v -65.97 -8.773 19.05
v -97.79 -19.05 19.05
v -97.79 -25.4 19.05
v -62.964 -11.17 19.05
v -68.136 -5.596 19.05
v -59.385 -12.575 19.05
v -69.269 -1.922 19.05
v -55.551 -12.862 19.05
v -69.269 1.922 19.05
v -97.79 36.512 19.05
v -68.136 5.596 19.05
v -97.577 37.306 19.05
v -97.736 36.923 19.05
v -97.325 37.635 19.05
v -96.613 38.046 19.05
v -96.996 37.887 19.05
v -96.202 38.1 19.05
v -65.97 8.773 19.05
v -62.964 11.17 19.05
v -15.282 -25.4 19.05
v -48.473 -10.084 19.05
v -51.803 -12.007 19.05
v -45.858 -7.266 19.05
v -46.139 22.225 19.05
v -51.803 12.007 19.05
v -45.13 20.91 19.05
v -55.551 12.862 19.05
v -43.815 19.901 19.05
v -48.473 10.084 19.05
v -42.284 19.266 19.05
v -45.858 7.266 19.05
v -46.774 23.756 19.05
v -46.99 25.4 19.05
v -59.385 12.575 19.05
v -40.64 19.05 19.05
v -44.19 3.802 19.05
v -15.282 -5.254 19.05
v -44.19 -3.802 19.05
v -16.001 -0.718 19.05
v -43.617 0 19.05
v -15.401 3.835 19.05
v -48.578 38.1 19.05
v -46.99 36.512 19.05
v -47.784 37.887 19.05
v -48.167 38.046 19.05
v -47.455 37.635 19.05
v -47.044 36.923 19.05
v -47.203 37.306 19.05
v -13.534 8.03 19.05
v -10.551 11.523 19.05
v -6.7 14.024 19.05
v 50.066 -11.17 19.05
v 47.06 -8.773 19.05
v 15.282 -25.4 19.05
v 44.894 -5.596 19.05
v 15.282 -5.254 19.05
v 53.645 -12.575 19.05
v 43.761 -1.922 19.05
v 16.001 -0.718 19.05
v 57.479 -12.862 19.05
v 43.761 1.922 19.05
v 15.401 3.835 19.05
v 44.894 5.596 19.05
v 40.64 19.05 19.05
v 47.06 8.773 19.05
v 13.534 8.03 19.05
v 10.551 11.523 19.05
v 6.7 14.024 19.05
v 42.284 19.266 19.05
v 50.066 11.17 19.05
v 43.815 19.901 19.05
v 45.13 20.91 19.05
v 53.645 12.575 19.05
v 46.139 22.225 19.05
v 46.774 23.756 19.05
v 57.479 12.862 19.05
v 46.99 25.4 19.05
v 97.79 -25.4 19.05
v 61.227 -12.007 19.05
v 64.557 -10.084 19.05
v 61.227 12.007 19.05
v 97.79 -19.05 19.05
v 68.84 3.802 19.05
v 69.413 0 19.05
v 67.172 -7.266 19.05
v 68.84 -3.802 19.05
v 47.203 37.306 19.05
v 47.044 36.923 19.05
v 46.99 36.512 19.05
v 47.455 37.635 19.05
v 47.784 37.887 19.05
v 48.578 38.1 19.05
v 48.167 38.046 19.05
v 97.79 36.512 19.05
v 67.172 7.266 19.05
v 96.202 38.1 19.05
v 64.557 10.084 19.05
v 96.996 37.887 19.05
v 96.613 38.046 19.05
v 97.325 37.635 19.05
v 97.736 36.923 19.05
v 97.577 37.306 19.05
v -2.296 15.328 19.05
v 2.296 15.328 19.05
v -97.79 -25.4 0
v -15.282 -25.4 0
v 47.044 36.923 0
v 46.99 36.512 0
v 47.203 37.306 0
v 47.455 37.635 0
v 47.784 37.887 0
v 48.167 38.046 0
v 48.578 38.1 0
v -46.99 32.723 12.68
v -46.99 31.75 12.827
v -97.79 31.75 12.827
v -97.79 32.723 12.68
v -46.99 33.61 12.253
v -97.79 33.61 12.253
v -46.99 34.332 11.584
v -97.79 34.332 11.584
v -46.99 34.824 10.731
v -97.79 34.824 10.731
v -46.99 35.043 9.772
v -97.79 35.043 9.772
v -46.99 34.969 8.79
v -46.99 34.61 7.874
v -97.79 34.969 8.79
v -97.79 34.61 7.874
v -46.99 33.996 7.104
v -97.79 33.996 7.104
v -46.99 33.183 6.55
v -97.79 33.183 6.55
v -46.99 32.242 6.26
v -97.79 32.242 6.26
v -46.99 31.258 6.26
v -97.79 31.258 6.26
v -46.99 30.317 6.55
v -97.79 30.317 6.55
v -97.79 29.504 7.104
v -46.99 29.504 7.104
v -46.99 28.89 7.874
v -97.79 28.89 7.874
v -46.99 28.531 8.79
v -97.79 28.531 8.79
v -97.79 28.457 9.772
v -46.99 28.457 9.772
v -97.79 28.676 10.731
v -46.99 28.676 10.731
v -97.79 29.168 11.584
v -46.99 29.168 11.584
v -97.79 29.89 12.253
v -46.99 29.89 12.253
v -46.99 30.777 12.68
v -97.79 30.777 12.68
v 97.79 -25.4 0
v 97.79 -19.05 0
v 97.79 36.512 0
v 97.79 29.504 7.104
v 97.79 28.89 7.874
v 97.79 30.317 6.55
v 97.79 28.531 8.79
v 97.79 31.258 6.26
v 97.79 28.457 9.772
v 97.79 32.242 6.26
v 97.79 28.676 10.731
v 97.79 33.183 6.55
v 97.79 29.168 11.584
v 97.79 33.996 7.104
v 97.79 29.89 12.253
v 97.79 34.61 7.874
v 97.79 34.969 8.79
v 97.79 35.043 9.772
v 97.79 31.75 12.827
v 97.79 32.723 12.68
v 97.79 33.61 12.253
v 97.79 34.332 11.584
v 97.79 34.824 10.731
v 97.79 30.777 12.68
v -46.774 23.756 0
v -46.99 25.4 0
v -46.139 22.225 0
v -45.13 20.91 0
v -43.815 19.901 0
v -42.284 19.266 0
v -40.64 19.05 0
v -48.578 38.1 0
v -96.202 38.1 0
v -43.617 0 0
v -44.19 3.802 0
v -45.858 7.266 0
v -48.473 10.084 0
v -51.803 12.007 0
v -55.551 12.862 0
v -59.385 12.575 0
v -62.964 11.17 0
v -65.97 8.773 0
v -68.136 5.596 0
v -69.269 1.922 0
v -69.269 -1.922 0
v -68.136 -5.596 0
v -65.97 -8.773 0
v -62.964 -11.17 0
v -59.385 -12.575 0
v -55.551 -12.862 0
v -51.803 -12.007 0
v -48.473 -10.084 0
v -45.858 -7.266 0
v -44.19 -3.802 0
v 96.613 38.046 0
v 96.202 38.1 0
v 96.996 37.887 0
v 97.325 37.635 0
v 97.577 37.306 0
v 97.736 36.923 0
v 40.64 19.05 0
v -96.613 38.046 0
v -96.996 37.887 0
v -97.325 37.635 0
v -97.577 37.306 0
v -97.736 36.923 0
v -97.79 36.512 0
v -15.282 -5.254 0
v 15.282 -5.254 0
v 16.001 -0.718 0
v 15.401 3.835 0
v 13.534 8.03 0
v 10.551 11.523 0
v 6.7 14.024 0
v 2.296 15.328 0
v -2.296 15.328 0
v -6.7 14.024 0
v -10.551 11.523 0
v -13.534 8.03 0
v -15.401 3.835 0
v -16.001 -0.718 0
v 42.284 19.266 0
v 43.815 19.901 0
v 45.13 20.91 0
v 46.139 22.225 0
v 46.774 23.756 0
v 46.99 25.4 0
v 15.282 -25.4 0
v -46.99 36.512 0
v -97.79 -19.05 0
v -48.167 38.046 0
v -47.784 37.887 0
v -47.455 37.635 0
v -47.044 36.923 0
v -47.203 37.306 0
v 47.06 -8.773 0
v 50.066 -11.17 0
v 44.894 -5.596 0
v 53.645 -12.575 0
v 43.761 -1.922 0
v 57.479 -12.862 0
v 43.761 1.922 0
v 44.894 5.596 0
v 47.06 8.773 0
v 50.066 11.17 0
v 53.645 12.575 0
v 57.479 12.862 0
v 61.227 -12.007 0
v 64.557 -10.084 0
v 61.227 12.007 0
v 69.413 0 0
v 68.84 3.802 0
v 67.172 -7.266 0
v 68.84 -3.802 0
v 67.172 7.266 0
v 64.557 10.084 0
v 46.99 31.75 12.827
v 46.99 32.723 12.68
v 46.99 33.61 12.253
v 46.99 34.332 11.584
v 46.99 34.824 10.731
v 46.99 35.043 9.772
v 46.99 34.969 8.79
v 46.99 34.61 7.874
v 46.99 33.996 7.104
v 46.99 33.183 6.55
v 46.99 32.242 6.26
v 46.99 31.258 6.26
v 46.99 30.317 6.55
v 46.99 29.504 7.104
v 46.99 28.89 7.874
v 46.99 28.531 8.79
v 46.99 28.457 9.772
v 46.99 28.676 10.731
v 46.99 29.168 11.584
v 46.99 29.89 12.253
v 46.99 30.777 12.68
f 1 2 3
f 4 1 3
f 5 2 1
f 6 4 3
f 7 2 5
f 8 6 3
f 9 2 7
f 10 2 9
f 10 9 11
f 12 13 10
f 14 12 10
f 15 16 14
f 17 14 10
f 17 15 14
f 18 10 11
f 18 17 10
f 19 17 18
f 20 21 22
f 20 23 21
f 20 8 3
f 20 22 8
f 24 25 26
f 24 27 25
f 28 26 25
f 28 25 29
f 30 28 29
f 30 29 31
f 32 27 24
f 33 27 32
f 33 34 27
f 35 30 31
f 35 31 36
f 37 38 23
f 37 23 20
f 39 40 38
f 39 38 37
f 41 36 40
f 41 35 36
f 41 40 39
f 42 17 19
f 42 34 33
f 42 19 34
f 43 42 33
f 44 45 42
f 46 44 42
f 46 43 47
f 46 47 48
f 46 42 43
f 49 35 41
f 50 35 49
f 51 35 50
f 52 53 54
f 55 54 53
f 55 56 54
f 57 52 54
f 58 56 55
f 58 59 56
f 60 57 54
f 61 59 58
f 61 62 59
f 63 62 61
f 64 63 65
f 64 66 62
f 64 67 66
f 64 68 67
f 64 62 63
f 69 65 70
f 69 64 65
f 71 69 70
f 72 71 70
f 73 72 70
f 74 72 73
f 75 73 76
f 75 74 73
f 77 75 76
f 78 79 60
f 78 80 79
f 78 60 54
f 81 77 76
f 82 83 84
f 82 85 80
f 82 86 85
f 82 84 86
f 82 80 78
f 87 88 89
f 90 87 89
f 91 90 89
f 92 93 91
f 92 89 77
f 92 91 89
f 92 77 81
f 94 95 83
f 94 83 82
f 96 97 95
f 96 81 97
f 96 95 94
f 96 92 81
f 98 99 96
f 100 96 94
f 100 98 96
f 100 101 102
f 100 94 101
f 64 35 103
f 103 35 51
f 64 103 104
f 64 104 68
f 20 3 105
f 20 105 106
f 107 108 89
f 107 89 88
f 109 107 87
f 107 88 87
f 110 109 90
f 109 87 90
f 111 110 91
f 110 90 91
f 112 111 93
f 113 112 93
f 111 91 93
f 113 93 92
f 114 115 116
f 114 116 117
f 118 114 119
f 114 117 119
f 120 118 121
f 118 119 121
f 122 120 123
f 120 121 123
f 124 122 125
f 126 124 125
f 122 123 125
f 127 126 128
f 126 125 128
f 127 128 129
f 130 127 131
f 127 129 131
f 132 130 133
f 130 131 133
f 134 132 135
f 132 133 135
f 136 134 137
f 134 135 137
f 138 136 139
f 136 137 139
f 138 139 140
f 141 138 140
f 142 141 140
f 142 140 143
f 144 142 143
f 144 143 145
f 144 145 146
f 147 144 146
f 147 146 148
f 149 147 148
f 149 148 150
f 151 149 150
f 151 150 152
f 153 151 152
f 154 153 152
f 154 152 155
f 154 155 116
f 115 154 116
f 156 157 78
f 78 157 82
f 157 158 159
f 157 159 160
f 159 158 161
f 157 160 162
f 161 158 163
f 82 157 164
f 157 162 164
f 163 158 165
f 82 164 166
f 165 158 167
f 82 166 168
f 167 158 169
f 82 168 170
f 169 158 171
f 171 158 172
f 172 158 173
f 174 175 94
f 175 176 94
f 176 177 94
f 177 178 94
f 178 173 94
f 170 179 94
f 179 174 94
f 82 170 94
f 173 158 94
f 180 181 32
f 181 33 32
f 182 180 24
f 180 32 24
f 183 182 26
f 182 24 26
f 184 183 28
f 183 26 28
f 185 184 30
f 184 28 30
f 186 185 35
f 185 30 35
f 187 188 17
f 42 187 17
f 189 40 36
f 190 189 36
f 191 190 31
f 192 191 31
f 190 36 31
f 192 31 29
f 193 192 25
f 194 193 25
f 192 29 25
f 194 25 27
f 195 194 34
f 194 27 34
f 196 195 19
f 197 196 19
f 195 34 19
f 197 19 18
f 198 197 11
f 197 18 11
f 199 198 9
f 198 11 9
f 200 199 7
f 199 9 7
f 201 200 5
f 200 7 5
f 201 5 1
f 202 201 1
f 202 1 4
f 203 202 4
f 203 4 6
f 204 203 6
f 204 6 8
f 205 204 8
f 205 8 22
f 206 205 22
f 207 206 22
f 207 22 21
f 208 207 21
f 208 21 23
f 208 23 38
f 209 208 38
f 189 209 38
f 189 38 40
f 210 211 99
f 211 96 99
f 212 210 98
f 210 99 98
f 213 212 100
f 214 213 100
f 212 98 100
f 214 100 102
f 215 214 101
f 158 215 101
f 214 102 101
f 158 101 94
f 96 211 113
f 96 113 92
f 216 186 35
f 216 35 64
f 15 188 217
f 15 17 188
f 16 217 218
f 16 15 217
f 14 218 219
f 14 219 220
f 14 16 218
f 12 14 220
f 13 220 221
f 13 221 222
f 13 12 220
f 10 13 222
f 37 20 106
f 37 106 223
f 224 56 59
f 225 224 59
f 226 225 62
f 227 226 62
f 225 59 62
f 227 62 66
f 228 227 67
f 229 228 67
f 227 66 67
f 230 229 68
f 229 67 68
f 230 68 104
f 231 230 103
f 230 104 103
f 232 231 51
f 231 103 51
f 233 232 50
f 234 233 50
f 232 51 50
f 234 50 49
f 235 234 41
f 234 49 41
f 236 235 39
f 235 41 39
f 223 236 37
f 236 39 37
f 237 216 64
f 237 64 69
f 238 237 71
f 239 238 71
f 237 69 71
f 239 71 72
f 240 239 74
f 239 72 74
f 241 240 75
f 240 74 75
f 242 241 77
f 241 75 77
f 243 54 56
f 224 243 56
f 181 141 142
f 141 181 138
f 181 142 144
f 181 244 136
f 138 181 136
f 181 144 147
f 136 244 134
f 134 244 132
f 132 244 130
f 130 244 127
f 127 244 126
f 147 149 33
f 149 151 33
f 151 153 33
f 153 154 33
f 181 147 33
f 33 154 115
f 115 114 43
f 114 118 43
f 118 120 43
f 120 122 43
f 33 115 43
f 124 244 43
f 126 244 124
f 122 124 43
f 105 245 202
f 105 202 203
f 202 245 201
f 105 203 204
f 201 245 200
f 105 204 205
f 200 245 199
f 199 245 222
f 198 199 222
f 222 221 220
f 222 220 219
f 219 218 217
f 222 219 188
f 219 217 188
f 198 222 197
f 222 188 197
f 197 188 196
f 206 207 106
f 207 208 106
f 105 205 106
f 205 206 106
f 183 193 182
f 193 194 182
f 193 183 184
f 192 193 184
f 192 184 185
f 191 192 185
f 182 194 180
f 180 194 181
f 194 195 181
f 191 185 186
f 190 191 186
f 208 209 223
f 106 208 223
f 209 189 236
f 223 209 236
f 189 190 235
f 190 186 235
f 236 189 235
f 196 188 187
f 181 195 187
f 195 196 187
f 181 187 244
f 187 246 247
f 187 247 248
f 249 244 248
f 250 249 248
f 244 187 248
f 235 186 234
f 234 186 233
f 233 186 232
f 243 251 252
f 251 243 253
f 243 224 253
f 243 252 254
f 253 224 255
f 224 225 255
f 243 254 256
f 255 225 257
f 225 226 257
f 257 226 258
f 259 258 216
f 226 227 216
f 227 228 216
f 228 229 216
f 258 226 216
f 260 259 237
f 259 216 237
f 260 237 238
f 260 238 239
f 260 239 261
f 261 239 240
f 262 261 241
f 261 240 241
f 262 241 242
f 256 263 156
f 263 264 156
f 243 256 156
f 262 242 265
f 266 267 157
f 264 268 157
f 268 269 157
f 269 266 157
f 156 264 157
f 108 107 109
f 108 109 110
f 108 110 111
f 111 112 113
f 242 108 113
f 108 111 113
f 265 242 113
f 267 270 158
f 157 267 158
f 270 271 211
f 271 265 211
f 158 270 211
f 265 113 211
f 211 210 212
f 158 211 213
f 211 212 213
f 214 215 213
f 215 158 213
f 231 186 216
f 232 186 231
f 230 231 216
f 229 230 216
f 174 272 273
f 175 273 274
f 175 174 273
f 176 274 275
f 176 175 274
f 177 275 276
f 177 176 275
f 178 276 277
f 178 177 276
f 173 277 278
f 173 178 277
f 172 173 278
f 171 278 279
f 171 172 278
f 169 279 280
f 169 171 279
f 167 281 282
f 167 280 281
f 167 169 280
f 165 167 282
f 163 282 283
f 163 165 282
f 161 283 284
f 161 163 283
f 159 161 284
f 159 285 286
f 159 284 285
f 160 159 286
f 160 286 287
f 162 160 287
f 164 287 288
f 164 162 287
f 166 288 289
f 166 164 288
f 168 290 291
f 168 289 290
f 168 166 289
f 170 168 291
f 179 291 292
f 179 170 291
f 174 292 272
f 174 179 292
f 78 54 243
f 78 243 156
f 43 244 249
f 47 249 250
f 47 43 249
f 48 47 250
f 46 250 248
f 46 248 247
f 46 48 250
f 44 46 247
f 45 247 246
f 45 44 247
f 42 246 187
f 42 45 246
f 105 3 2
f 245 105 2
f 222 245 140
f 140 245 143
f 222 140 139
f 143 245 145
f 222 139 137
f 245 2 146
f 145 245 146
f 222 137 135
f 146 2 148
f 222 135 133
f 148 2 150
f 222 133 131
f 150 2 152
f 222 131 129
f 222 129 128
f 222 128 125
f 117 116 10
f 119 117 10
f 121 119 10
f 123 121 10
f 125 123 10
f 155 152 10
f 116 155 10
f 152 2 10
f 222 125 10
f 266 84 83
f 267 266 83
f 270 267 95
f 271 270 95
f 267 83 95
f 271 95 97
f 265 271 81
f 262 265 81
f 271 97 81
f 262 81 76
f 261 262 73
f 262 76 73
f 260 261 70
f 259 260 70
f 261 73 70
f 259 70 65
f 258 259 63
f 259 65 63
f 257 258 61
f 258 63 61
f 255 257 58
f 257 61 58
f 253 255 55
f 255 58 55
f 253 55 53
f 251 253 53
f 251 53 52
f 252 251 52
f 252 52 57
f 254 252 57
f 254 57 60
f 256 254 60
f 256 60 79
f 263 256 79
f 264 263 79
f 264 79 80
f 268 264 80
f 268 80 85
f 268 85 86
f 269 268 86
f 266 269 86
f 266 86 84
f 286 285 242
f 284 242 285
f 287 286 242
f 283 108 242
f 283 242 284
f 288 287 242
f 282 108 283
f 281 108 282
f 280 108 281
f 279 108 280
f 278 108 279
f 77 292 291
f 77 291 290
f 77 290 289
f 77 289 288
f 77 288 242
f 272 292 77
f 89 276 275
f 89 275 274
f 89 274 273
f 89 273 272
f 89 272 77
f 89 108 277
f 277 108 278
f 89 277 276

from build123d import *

# Parameters (mm, degrees)
SKETCH1_W               = 195.58
SKETCH1_H               = 38.1
BOSS_EXTRUDE1_DEPTH     = 19.05
SKETCH2_R               = 12.8984375
CUT_EXTRUDE1_DEPTH      = 20.05
CUT_EXTRUDE2_DEPTH      = 20.05
SKETCH4_W               = 19.05
SKETCH4_H               = 19.05
BOSS_EXTRUDE2_DEPTH     = 50.8
SKETCH6_R               = 3.302
CUT_EXTRUDE3_DEPTH      = 196.58
FILLET1_R               = 6.35
FILLET2_R               = 1.5875
SKETCH7_W               = 86.796683621
SKETCH7_H               = 6.35
BOSS_EXTRUDE3_DEPTH     = 19.05
SKETCH8_W               = 30.563761808
SKETCH8_H               = 20.145620364
CUT_EXTRUDE4_DEPTH      = 1
CUT_EXTRUDE4_DEPTH_BACK = 20.05


with BuildPart() as part:
    # Sketch1 → Boss-Extrude1 (new body)
    with BuildSketch(Plane.XY):
        Rectangle(SKETCH1_W, SKETCH1_H)
    extrude(amount=BOSS_EXTRUDE1_DEPTH)

    # Sketch2 → Cut-Extrude1 (cut, through all)
    with BuildSketch(Plane.XY.offset(19.05)):
        with Locations((-56.515, 0)):
            Circle(SKETCH2_R)
        with Locations((56.515, 0)):
            Circle(SKETCH2_R)
    extrude(amount=-CUT_EXTRUDE1_DEPTH, mode=Mode.SUBTRACT)

    # Sketch3 → Cut-Extrude2 (cut, through all)
    with BuildSketch(Plane.XY.offset(19.05)):
        with BuildLine():
            Line((-15.281880904, -5.254379636), (-10.086091047, -21.968397565))
            Line((-10.086091047, -21.968397565), (10.086091047, -21.968397565))
            Line((10.086091047, -21.968397565), (15.281880904, -5.254379636))
            ThreePointArc((15.281880904, -5.254379636), (0, 15.493999988), (-15.281880904, -5.254379636))
        make_face()
    extrude(amount=-CUT_EXTRUDE2_DEPTH, mode=Mode.SUBTRACT)

    # Sketch4 → Boss-Extrude2 (add)
    with BuildSketch(Plane.ZY.offset(97.79)):
        with Locations((9.525, 28.575)):
            Rectangle(SKETCH4_W, SKETCH4_H)
    boss_extrude2 = extrude(amount=-BOSS_EXTRUDE2_DEPTH)

    # Sketch6 → Cut-Extrude3 (cut, through all)
    with BuildSketch(Plane.ZY.offset(97.79)):
        with Locations((9.525, 31.75)):
            Circle(SKETCH6_R)
    cut_extrude3 = extrude(amount=-CUT_EXTRUDE3_DEPTH, mode=Mode.SUBTRACT)

    # Mirror2: Boss-Extrude2, Cut-Extrude3 across plane
    add(boss_extrude2.mirror(Plane(origin=(0, 0, 0), x_dir=(0, 0, 1), z_dir=(1, 0, 0))))
    add(cut_extrude3.mirror(Plane(origin=(0, 0, 0), x_dir=(0, 0, 1), z_dir=(1, 0, 0))), mode=Mode.SUBTRACT)

    # Fillet1
    fillet1_edges = [part.edges().sort_by_distance(p)[0] for p in [
        (-46.99, 19.05, 9.525),
        (46.99, 19.05, 9.525),
    ]]
    fillet(fillet1_edges, radius=FILLET1_R)

    # Fillet2
    fillet2_edges = [part.edges().sort_by_distance(p)[0] for p in [
        (-46.99, 38.1, 9.525),
        (-97.79, 38.1, 9.525),
        (97.79, 38.1, 9.525),
        (46.99, 38.1, 9.525),
    ]]
    fillet(fillet2_edges, radius=FILLET2_R)

    # Sketch7 → Boss-Extrude3 (add)
    with BuildSketch(Plane.XY.offset(19.05)):
        with Locations((-54.39165819, -22.225)):
            Rectangle(SKETCH7_W, SKETCH7_H)
        with Locations((54.39165819, -22.225)):
            Rectangle(SKETCH7_W, SKETCH7_H)
    extrude(amount=-BOSS_EXTRUDE3_DEPTH)

    # Sketch8 → Cut-Extrude4 (cut, two sides)
    with BuildSketch(Plane.XY.offset(19.05)) as cut_extrude4_sk:
        with Locations((0, -15.327189818)):
            Rectangle(SKETCH8_W, SKETCH8_H)
    extrude(amount=CUT_EXTRUDE4_DEPTH, mode=Mode.SUBTRACT)
    extrude(cut_extrude4_sk.sketch, amount=-CUT_EXTRUDE4_DEPTH_BACK, mode=Mode.SUBTRACT)


solid = part.part
